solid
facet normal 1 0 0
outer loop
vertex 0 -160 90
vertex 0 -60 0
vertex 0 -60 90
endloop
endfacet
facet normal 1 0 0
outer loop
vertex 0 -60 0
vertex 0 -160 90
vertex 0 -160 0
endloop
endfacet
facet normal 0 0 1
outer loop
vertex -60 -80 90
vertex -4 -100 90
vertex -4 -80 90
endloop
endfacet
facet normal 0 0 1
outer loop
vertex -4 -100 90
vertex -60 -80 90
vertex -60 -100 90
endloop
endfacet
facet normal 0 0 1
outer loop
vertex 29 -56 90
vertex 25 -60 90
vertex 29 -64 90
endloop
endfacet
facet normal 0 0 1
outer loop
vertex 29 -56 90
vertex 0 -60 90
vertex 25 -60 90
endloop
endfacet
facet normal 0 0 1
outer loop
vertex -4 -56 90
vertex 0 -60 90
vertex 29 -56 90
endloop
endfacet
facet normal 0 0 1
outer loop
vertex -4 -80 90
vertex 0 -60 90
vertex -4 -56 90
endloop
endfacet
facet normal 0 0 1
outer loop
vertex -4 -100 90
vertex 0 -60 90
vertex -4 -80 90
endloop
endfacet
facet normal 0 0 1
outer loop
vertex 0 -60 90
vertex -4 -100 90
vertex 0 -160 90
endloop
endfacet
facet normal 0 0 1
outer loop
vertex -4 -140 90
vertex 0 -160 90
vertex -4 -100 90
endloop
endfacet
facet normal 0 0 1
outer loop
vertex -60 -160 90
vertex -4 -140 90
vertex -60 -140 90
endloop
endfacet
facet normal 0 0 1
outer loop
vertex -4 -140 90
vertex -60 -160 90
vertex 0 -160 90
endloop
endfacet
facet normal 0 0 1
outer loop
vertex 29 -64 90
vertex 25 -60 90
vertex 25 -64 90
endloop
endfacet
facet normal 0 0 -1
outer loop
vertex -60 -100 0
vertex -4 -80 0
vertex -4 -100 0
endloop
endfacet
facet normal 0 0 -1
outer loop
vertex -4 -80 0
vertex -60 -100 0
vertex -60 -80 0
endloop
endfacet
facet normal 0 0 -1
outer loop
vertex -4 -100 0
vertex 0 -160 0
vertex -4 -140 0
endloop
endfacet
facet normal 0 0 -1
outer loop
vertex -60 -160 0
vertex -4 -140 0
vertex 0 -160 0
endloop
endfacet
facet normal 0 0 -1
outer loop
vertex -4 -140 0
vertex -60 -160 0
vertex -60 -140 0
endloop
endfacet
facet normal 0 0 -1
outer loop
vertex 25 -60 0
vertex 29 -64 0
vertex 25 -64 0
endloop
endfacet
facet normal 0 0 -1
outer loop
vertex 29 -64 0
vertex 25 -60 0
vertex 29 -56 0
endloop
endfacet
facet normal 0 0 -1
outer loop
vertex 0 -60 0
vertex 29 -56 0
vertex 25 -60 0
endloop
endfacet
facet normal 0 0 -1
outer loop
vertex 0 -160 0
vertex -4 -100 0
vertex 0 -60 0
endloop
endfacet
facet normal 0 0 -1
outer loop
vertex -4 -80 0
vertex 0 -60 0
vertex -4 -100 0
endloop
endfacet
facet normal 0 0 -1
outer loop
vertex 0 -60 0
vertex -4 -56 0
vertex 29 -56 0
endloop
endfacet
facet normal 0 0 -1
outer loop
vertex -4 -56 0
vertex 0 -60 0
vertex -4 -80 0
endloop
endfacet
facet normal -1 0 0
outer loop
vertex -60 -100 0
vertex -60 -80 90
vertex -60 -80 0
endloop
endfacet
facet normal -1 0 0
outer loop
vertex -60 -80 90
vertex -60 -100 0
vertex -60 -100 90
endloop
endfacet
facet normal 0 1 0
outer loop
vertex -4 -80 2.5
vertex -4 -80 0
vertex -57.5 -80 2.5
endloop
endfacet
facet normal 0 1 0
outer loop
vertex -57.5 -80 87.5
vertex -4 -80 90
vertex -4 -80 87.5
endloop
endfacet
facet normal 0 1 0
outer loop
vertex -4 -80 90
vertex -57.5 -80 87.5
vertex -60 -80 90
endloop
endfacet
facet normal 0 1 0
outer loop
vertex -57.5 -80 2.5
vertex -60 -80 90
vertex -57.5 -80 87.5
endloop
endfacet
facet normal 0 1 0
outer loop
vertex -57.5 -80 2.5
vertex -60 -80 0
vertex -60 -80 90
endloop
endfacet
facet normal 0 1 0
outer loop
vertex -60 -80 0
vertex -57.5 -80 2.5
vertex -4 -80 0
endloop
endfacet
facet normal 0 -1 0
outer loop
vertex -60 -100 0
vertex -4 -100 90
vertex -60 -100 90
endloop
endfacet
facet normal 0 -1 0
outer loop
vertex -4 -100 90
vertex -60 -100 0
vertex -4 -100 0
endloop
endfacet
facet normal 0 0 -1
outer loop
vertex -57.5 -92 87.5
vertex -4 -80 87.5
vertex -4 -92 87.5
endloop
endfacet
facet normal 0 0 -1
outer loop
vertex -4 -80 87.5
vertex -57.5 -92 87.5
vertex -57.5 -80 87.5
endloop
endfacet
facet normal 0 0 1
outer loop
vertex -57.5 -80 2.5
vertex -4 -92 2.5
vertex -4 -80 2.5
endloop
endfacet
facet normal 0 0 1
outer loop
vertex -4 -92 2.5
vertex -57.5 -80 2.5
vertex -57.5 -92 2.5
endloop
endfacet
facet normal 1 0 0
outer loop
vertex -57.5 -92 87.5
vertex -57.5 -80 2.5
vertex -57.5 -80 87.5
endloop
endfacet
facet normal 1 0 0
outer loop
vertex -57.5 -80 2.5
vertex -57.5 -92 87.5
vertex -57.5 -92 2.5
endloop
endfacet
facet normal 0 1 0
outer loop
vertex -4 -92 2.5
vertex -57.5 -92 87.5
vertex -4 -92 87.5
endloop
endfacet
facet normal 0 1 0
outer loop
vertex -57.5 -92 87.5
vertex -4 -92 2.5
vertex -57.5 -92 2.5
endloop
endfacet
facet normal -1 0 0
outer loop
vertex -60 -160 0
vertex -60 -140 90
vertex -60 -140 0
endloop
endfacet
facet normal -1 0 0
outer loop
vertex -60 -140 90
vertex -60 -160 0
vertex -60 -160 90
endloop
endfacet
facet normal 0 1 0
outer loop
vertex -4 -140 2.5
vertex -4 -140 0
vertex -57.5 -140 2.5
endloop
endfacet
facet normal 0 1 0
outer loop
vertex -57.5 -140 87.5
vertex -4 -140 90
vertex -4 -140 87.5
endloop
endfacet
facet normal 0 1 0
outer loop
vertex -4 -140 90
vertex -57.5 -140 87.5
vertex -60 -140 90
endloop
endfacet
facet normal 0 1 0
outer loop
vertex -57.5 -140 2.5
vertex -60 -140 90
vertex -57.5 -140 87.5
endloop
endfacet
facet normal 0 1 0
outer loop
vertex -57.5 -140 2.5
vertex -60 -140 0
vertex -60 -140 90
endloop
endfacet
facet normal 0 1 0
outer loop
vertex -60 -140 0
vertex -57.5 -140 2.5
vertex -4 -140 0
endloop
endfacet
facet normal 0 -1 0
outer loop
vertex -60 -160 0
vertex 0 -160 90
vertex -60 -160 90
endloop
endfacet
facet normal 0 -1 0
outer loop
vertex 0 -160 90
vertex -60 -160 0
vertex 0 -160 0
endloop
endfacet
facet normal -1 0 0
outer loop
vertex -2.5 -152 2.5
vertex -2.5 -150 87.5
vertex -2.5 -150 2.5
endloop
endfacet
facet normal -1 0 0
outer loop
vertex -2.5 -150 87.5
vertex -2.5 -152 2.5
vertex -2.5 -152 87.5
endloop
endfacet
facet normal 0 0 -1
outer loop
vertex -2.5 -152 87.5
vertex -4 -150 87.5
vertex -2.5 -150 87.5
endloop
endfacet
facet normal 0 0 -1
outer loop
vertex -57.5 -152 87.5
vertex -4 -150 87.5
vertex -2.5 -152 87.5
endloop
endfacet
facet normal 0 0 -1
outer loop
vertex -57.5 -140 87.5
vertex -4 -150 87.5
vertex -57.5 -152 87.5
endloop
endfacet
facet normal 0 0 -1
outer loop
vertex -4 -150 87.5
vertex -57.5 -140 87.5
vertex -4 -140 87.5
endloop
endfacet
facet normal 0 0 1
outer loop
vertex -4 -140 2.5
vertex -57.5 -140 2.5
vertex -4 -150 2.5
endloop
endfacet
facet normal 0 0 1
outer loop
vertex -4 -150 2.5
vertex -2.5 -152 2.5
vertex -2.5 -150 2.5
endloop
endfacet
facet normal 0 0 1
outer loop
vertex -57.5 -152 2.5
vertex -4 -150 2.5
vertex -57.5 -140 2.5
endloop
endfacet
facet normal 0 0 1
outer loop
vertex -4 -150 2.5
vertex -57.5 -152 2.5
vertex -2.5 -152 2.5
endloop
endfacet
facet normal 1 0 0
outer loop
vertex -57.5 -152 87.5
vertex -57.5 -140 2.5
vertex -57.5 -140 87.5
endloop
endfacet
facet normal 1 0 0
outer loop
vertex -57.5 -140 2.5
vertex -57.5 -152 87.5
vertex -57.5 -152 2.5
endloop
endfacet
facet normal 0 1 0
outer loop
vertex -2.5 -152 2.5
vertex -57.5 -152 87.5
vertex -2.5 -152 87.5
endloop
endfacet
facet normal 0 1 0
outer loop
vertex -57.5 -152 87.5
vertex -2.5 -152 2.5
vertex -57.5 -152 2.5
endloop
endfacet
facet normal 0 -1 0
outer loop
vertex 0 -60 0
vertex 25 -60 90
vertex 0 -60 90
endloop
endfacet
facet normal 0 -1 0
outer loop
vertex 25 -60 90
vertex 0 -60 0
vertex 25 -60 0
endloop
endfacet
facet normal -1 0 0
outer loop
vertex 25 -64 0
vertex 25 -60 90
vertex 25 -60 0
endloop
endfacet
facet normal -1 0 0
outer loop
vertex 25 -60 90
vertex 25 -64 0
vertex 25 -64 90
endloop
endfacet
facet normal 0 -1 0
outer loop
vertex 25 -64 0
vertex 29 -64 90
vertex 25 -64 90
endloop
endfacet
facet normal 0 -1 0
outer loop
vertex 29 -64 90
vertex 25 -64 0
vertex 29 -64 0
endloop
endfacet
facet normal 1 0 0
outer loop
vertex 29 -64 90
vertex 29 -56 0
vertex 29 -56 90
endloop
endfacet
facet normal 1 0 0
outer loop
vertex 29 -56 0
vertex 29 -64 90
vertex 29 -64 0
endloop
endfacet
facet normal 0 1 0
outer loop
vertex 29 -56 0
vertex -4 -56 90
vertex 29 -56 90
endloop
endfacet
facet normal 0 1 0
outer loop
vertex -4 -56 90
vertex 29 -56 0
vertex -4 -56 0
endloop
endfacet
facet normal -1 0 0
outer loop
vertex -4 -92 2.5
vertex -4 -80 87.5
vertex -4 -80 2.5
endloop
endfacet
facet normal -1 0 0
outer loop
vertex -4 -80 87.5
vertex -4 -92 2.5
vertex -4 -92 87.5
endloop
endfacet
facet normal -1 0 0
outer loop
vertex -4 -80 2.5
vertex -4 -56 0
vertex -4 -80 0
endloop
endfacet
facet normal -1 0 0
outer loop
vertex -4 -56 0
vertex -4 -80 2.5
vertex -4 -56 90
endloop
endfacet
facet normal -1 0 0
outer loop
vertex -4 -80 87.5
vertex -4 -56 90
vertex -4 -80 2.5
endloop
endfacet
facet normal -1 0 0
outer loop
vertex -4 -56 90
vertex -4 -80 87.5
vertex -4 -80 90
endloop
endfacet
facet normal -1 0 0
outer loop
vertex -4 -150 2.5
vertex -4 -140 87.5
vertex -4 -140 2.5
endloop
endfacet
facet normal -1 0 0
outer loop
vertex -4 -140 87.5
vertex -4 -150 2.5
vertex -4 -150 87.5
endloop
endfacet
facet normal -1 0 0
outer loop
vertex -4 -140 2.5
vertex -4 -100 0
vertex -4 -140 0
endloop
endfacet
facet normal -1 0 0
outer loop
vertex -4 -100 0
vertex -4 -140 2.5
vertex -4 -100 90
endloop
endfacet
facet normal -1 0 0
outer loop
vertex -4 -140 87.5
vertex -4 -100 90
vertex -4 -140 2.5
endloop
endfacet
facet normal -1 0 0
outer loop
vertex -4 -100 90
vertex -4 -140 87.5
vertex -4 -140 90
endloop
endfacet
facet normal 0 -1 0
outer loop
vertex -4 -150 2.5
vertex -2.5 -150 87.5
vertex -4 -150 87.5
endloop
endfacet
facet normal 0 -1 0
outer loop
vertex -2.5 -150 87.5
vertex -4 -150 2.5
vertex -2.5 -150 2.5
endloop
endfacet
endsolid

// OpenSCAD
    
linear_extrude (height=90, $fn = 200)
import (file="profil.dxf", layer="4", $fn=500);

translate([-60,-100,0])
    difference(){
        cube ([60,20,90]);
        translate([2.5,8,2.5])
            cube ([55,45,85]);
    }
    
 translate([-60,-160,0])
    difference(){
        cube ([60,20,90]);
        translate([2.5,8,2.5])
            cube ([55,45,85]);
    }
       
   
